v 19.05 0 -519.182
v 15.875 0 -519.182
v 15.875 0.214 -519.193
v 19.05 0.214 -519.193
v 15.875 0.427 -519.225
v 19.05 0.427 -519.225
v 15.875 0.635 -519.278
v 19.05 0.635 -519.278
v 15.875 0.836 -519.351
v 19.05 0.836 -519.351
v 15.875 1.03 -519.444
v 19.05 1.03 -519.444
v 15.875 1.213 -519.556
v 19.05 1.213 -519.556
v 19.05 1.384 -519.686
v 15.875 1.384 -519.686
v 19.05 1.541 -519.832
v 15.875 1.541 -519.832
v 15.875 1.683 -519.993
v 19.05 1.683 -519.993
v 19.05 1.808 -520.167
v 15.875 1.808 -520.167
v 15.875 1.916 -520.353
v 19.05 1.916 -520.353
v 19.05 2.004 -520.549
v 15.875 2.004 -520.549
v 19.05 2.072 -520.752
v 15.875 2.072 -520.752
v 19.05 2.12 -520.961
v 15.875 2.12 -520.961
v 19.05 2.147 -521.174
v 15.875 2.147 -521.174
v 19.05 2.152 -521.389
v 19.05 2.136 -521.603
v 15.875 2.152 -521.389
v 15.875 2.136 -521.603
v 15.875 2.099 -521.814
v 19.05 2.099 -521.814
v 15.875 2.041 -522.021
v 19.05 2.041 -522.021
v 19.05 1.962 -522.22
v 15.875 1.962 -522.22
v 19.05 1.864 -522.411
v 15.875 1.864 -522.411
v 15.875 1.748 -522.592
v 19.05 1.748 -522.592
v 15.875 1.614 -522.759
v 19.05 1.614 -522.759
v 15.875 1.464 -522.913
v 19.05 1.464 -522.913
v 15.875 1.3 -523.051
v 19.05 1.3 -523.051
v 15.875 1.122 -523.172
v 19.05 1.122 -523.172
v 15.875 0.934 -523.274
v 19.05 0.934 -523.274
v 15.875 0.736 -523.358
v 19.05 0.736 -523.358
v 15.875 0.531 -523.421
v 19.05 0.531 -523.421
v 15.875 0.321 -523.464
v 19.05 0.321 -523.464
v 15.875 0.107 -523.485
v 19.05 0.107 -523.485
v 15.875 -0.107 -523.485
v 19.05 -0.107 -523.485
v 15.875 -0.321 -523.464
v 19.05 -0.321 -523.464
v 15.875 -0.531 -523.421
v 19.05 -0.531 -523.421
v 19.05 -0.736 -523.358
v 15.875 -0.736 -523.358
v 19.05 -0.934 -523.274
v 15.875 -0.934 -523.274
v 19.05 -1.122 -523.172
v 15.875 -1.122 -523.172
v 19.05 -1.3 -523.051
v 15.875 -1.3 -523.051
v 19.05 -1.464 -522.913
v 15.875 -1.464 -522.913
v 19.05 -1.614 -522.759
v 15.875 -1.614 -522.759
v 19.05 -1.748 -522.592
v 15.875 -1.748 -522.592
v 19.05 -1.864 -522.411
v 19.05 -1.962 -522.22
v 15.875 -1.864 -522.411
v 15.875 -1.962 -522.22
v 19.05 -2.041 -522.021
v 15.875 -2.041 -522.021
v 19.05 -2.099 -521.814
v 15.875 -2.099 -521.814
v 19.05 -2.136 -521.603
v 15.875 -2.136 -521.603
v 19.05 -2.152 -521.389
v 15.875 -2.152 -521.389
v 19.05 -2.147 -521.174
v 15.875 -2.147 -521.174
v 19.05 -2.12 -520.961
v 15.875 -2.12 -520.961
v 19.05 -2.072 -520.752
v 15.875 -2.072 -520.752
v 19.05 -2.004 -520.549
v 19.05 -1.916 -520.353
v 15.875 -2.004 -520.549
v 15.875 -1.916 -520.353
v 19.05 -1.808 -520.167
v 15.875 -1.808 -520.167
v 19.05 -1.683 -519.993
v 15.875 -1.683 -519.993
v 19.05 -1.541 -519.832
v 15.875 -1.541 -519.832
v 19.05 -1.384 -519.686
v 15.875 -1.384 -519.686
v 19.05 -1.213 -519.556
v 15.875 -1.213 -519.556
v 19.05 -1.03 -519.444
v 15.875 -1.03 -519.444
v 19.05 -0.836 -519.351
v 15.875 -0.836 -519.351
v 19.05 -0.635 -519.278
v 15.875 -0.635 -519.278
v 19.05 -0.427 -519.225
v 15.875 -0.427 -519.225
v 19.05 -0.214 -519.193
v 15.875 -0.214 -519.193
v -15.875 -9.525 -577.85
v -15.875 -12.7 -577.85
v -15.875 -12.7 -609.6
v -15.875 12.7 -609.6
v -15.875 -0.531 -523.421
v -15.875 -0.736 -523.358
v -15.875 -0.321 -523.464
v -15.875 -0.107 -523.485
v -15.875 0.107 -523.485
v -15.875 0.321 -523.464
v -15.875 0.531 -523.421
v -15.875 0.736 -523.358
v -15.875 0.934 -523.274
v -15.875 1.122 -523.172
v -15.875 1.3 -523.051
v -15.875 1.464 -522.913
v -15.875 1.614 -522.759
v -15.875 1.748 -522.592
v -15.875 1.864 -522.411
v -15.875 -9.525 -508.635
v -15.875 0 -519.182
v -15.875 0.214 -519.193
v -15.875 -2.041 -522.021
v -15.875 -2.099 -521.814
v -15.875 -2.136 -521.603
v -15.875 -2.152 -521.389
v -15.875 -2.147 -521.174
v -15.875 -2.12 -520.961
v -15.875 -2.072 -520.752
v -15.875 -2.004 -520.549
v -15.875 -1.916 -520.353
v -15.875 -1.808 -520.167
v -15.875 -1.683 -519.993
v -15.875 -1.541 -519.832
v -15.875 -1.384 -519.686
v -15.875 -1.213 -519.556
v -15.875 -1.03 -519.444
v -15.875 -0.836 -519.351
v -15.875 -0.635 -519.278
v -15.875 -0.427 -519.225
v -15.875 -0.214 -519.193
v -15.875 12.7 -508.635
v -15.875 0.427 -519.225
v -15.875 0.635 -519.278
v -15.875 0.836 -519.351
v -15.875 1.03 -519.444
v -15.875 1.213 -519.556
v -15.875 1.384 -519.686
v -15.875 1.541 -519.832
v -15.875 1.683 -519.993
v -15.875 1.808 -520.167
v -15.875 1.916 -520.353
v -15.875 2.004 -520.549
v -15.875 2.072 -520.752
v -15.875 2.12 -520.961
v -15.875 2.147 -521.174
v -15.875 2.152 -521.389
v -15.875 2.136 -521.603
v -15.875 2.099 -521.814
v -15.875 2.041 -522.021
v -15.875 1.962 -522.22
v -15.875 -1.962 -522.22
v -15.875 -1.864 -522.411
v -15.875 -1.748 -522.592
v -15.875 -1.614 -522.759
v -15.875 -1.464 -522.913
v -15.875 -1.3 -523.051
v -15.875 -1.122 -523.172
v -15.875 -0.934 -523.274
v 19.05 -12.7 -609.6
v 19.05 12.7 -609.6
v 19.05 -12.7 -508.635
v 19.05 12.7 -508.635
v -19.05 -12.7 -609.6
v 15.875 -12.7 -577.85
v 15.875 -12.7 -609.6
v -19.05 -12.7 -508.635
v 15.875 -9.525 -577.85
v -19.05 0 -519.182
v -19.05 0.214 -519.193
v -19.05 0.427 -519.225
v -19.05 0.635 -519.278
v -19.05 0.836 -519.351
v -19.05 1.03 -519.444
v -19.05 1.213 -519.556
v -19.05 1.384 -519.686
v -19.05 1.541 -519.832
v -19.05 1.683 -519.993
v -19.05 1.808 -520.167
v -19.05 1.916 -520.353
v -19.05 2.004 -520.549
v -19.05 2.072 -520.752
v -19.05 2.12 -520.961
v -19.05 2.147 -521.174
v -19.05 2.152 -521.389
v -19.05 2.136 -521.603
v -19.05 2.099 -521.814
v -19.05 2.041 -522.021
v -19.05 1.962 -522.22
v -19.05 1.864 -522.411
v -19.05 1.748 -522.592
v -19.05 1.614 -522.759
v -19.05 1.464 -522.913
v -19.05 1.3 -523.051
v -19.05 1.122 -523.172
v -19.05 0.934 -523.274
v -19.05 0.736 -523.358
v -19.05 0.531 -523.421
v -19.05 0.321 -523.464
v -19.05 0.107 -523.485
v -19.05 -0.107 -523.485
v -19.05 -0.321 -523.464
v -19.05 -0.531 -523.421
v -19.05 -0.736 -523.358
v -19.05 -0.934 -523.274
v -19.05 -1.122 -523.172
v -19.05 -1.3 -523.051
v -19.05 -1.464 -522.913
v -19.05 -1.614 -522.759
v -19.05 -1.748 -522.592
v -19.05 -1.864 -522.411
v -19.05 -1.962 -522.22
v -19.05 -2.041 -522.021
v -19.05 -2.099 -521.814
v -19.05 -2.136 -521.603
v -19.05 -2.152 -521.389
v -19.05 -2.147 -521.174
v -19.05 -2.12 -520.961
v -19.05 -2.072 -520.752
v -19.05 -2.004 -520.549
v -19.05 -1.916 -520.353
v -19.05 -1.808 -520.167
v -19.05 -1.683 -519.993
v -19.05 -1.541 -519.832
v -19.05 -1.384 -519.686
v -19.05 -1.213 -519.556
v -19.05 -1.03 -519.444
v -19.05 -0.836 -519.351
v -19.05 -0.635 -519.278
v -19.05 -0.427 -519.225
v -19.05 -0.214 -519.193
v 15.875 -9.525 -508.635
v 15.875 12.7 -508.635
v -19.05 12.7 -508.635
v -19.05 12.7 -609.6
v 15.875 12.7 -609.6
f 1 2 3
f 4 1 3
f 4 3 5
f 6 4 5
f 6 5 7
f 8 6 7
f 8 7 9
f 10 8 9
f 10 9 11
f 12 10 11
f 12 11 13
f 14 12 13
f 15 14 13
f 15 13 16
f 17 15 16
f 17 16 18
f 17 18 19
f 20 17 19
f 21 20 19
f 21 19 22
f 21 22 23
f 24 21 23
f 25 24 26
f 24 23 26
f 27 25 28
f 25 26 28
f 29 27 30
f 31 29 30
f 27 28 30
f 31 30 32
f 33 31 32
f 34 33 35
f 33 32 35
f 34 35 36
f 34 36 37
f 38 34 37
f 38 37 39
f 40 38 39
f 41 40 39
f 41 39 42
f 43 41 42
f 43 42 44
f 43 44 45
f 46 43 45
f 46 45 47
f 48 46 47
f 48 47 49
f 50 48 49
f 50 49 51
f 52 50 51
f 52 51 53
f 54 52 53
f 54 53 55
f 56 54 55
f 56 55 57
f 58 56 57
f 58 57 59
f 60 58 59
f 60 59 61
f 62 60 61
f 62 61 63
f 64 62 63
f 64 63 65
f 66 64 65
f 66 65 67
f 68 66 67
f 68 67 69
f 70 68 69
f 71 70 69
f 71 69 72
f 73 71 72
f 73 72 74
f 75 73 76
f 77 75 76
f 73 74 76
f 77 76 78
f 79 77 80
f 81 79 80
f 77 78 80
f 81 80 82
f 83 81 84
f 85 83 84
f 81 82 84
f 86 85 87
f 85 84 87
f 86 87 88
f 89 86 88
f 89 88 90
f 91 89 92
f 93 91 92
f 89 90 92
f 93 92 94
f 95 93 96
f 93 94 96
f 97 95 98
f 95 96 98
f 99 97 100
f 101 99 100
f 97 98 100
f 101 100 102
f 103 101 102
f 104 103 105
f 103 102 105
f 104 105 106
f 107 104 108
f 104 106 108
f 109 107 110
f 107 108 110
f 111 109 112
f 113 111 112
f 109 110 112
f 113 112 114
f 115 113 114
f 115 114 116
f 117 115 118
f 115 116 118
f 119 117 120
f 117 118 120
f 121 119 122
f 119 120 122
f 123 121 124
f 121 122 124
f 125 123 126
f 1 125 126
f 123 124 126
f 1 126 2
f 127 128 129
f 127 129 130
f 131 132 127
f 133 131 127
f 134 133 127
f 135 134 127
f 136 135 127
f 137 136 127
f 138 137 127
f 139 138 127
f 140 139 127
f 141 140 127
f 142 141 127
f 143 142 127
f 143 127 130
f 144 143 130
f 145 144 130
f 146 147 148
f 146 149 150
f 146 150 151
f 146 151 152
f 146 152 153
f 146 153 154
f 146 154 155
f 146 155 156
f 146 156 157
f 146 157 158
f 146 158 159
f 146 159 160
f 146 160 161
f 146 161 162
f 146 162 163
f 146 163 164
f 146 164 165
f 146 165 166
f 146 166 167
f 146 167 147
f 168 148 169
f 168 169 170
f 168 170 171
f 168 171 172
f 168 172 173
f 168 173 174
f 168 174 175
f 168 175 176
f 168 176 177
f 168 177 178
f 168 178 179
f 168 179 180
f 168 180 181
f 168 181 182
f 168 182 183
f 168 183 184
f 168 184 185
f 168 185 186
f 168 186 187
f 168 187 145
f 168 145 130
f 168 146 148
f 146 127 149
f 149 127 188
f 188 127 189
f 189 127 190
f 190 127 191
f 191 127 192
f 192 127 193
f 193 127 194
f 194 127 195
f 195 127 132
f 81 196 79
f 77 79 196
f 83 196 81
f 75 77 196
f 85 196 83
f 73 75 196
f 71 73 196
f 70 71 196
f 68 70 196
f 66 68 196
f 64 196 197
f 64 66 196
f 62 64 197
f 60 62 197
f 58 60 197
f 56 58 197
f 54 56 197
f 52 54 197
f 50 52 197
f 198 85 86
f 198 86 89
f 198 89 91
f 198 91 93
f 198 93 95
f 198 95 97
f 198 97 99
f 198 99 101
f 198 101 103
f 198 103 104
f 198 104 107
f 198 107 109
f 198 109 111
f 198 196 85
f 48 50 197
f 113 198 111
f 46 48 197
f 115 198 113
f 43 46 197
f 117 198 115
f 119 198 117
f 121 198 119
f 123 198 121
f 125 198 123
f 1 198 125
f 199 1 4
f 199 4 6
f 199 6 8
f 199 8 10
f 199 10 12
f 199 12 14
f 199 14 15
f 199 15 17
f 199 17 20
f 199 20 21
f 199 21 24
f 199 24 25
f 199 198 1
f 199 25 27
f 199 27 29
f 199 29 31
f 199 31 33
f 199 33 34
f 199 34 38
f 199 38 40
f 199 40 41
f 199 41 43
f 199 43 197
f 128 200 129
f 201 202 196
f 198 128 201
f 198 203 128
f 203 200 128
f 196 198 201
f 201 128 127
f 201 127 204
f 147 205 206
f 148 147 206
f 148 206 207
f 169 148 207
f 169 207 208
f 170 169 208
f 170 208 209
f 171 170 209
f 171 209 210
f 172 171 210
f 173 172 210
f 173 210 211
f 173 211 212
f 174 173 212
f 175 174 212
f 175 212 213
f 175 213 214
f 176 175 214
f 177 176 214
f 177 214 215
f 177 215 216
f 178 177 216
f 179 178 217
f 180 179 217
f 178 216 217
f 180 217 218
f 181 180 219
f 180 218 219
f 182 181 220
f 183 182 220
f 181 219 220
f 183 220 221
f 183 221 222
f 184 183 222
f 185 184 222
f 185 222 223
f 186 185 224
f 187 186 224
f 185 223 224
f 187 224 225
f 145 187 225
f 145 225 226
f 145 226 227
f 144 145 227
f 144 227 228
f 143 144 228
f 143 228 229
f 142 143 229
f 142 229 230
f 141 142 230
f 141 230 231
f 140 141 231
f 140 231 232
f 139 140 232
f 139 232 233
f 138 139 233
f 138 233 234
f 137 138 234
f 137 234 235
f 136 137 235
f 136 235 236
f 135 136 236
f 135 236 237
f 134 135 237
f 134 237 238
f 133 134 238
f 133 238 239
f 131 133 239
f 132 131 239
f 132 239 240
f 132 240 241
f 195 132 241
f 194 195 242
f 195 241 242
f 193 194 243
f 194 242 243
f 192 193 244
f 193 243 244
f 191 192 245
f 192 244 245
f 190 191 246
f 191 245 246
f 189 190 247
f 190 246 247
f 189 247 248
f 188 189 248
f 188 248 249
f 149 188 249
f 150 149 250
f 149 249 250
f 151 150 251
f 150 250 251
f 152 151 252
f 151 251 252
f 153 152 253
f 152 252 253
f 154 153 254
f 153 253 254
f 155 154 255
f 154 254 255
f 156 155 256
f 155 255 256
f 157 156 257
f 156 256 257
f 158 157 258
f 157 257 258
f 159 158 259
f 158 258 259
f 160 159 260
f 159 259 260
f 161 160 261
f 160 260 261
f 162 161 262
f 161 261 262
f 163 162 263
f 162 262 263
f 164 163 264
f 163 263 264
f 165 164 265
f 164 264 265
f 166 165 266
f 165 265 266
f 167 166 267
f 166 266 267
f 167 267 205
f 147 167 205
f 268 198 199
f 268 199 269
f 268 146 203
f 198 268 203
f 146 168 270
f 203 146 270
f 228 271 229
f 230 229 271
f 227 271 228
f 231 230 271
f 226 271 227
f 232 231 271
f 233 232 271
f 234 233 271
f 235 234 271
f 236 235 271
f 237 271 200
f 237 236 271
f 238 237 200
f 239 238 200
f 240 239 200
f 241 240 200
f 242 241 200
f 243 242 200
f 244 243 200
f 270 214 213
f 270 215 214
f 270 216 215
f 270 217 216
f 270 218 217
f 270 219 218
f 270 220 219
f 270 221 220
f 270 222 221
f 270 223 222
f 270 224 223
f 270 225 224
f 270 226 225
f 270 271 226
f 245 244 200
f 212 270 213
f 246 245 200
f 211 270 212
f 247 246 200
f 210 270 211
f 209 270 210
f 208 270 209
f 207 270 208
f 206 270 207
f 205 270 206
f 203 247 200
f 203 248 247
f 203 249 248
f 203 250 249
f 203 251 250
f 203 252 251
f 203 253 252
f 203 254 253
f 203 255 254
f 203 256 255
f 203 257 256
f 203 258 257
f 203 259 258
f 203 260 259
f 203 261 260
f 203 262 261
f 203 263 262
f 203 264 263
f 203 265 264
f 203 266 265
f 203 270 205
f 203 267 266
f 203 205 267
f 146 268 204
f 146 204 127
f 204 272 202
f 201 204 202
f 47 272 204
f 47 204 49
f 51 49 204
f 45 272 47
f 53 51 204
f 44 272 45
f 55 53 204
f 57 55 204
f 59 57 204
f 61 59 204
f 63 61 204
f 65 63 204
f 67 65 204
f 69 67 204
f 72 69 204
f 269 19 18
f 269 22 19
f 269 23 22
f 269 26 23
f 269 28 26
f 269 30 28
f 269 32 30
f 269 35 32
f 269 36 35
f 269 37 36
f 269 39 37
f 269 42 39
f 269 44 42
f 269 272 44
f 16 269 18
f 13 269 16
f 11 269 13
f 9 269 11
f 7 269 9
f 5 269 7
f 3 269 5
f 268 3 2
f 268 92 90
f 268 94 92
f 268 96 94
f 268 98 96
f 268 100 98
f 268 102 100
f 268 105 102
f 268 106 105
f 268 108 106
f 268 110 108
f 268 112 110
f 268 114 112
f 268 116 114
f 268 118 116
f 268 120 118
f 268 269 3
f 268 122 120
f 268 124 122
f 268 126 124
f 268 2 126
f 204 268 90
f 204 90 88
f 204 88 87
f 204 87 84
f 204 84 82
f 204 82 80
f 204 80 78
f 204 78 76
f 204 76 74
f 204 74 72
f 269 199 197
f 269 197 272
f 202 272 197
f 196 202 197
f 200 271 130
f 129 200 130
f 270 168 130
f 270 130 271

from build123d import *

# Parameters (mm, degrees)
BOSS_EXTRUDE2_DEPTH   = 609.6
CUT_EXTRUDE1_DEPTH    = 1118.235
CUT_EXTRUDE2_REACH    = 612.426
SKETCH6_W             = 31.75
SKETCH6_H             = 31.75
F_6_CLEARANCE_HOLE1_D = 4.3053


with BuildPart() as part:
    # Sketch3 → Boss-Extrude2 (new, symmetric)
    with BuildSketch(Plane.XY):
        Polygon((-19.05, 12.7), (-19.05, -12.7), (19.05, -12.7), (19.05, 12.7), (15.875, 12.7), (15.875, -9.525), (-15.875, -9.525), (-15.875, 12.7), align=None)
    extrude(amount=BOSS_EXTRUDE2_DEPTH, both=True)

    # Sketch5 → Cut-Extrude1 (cut)
    with BuildSketch(Plane.XY.offset(609.6)):
        Polygon((-19.05, 12.7), (-15.875, 12.7), (-15.875, -9.525), (15.875, -9.525), (15.875, 12.7), (19.05, 12.7), (19.05, -12.7), (-19.05, -12.7), align=None)
    extrude(amount=-CUT_EXTRUDE1_DEPTH, mode=Mode.SUBTRACT)

    # Sketch6 → Cut-Extrude2 (cut, up to next)
    with BuildSketch(Plane.XZ.offset(12.7), mode=Mode.PRIVATE) as cut_extrude2_sk1:
        with Locations((0, -593.725)):
            Rectangle(SKETCH6_W, SKETCH6_H)
    cut_extrude2_tool1 = extrude(cut_extrude2_sk1.sketch, amount=-CUT_EXTRUDE2_REACH, mode=Mode.PRIVATE) & part.part
    add(cut_extrude2_tool1.solids().sort_by_distance((0, -12.7, -593.725))[0], mode=Mode.SUBTRACT)

    # #6 Clearance Hole1 (through all)
    with Locations(Plane(origin=(19.05, 0, 0), x_dir=(0, 0, -1), z_dir=(1, 0, 0))):
        with Locations((521.335, 0)):
            Hole(F_6_CLEARANCE_HOLE1_D / 2)


solid = part.part
